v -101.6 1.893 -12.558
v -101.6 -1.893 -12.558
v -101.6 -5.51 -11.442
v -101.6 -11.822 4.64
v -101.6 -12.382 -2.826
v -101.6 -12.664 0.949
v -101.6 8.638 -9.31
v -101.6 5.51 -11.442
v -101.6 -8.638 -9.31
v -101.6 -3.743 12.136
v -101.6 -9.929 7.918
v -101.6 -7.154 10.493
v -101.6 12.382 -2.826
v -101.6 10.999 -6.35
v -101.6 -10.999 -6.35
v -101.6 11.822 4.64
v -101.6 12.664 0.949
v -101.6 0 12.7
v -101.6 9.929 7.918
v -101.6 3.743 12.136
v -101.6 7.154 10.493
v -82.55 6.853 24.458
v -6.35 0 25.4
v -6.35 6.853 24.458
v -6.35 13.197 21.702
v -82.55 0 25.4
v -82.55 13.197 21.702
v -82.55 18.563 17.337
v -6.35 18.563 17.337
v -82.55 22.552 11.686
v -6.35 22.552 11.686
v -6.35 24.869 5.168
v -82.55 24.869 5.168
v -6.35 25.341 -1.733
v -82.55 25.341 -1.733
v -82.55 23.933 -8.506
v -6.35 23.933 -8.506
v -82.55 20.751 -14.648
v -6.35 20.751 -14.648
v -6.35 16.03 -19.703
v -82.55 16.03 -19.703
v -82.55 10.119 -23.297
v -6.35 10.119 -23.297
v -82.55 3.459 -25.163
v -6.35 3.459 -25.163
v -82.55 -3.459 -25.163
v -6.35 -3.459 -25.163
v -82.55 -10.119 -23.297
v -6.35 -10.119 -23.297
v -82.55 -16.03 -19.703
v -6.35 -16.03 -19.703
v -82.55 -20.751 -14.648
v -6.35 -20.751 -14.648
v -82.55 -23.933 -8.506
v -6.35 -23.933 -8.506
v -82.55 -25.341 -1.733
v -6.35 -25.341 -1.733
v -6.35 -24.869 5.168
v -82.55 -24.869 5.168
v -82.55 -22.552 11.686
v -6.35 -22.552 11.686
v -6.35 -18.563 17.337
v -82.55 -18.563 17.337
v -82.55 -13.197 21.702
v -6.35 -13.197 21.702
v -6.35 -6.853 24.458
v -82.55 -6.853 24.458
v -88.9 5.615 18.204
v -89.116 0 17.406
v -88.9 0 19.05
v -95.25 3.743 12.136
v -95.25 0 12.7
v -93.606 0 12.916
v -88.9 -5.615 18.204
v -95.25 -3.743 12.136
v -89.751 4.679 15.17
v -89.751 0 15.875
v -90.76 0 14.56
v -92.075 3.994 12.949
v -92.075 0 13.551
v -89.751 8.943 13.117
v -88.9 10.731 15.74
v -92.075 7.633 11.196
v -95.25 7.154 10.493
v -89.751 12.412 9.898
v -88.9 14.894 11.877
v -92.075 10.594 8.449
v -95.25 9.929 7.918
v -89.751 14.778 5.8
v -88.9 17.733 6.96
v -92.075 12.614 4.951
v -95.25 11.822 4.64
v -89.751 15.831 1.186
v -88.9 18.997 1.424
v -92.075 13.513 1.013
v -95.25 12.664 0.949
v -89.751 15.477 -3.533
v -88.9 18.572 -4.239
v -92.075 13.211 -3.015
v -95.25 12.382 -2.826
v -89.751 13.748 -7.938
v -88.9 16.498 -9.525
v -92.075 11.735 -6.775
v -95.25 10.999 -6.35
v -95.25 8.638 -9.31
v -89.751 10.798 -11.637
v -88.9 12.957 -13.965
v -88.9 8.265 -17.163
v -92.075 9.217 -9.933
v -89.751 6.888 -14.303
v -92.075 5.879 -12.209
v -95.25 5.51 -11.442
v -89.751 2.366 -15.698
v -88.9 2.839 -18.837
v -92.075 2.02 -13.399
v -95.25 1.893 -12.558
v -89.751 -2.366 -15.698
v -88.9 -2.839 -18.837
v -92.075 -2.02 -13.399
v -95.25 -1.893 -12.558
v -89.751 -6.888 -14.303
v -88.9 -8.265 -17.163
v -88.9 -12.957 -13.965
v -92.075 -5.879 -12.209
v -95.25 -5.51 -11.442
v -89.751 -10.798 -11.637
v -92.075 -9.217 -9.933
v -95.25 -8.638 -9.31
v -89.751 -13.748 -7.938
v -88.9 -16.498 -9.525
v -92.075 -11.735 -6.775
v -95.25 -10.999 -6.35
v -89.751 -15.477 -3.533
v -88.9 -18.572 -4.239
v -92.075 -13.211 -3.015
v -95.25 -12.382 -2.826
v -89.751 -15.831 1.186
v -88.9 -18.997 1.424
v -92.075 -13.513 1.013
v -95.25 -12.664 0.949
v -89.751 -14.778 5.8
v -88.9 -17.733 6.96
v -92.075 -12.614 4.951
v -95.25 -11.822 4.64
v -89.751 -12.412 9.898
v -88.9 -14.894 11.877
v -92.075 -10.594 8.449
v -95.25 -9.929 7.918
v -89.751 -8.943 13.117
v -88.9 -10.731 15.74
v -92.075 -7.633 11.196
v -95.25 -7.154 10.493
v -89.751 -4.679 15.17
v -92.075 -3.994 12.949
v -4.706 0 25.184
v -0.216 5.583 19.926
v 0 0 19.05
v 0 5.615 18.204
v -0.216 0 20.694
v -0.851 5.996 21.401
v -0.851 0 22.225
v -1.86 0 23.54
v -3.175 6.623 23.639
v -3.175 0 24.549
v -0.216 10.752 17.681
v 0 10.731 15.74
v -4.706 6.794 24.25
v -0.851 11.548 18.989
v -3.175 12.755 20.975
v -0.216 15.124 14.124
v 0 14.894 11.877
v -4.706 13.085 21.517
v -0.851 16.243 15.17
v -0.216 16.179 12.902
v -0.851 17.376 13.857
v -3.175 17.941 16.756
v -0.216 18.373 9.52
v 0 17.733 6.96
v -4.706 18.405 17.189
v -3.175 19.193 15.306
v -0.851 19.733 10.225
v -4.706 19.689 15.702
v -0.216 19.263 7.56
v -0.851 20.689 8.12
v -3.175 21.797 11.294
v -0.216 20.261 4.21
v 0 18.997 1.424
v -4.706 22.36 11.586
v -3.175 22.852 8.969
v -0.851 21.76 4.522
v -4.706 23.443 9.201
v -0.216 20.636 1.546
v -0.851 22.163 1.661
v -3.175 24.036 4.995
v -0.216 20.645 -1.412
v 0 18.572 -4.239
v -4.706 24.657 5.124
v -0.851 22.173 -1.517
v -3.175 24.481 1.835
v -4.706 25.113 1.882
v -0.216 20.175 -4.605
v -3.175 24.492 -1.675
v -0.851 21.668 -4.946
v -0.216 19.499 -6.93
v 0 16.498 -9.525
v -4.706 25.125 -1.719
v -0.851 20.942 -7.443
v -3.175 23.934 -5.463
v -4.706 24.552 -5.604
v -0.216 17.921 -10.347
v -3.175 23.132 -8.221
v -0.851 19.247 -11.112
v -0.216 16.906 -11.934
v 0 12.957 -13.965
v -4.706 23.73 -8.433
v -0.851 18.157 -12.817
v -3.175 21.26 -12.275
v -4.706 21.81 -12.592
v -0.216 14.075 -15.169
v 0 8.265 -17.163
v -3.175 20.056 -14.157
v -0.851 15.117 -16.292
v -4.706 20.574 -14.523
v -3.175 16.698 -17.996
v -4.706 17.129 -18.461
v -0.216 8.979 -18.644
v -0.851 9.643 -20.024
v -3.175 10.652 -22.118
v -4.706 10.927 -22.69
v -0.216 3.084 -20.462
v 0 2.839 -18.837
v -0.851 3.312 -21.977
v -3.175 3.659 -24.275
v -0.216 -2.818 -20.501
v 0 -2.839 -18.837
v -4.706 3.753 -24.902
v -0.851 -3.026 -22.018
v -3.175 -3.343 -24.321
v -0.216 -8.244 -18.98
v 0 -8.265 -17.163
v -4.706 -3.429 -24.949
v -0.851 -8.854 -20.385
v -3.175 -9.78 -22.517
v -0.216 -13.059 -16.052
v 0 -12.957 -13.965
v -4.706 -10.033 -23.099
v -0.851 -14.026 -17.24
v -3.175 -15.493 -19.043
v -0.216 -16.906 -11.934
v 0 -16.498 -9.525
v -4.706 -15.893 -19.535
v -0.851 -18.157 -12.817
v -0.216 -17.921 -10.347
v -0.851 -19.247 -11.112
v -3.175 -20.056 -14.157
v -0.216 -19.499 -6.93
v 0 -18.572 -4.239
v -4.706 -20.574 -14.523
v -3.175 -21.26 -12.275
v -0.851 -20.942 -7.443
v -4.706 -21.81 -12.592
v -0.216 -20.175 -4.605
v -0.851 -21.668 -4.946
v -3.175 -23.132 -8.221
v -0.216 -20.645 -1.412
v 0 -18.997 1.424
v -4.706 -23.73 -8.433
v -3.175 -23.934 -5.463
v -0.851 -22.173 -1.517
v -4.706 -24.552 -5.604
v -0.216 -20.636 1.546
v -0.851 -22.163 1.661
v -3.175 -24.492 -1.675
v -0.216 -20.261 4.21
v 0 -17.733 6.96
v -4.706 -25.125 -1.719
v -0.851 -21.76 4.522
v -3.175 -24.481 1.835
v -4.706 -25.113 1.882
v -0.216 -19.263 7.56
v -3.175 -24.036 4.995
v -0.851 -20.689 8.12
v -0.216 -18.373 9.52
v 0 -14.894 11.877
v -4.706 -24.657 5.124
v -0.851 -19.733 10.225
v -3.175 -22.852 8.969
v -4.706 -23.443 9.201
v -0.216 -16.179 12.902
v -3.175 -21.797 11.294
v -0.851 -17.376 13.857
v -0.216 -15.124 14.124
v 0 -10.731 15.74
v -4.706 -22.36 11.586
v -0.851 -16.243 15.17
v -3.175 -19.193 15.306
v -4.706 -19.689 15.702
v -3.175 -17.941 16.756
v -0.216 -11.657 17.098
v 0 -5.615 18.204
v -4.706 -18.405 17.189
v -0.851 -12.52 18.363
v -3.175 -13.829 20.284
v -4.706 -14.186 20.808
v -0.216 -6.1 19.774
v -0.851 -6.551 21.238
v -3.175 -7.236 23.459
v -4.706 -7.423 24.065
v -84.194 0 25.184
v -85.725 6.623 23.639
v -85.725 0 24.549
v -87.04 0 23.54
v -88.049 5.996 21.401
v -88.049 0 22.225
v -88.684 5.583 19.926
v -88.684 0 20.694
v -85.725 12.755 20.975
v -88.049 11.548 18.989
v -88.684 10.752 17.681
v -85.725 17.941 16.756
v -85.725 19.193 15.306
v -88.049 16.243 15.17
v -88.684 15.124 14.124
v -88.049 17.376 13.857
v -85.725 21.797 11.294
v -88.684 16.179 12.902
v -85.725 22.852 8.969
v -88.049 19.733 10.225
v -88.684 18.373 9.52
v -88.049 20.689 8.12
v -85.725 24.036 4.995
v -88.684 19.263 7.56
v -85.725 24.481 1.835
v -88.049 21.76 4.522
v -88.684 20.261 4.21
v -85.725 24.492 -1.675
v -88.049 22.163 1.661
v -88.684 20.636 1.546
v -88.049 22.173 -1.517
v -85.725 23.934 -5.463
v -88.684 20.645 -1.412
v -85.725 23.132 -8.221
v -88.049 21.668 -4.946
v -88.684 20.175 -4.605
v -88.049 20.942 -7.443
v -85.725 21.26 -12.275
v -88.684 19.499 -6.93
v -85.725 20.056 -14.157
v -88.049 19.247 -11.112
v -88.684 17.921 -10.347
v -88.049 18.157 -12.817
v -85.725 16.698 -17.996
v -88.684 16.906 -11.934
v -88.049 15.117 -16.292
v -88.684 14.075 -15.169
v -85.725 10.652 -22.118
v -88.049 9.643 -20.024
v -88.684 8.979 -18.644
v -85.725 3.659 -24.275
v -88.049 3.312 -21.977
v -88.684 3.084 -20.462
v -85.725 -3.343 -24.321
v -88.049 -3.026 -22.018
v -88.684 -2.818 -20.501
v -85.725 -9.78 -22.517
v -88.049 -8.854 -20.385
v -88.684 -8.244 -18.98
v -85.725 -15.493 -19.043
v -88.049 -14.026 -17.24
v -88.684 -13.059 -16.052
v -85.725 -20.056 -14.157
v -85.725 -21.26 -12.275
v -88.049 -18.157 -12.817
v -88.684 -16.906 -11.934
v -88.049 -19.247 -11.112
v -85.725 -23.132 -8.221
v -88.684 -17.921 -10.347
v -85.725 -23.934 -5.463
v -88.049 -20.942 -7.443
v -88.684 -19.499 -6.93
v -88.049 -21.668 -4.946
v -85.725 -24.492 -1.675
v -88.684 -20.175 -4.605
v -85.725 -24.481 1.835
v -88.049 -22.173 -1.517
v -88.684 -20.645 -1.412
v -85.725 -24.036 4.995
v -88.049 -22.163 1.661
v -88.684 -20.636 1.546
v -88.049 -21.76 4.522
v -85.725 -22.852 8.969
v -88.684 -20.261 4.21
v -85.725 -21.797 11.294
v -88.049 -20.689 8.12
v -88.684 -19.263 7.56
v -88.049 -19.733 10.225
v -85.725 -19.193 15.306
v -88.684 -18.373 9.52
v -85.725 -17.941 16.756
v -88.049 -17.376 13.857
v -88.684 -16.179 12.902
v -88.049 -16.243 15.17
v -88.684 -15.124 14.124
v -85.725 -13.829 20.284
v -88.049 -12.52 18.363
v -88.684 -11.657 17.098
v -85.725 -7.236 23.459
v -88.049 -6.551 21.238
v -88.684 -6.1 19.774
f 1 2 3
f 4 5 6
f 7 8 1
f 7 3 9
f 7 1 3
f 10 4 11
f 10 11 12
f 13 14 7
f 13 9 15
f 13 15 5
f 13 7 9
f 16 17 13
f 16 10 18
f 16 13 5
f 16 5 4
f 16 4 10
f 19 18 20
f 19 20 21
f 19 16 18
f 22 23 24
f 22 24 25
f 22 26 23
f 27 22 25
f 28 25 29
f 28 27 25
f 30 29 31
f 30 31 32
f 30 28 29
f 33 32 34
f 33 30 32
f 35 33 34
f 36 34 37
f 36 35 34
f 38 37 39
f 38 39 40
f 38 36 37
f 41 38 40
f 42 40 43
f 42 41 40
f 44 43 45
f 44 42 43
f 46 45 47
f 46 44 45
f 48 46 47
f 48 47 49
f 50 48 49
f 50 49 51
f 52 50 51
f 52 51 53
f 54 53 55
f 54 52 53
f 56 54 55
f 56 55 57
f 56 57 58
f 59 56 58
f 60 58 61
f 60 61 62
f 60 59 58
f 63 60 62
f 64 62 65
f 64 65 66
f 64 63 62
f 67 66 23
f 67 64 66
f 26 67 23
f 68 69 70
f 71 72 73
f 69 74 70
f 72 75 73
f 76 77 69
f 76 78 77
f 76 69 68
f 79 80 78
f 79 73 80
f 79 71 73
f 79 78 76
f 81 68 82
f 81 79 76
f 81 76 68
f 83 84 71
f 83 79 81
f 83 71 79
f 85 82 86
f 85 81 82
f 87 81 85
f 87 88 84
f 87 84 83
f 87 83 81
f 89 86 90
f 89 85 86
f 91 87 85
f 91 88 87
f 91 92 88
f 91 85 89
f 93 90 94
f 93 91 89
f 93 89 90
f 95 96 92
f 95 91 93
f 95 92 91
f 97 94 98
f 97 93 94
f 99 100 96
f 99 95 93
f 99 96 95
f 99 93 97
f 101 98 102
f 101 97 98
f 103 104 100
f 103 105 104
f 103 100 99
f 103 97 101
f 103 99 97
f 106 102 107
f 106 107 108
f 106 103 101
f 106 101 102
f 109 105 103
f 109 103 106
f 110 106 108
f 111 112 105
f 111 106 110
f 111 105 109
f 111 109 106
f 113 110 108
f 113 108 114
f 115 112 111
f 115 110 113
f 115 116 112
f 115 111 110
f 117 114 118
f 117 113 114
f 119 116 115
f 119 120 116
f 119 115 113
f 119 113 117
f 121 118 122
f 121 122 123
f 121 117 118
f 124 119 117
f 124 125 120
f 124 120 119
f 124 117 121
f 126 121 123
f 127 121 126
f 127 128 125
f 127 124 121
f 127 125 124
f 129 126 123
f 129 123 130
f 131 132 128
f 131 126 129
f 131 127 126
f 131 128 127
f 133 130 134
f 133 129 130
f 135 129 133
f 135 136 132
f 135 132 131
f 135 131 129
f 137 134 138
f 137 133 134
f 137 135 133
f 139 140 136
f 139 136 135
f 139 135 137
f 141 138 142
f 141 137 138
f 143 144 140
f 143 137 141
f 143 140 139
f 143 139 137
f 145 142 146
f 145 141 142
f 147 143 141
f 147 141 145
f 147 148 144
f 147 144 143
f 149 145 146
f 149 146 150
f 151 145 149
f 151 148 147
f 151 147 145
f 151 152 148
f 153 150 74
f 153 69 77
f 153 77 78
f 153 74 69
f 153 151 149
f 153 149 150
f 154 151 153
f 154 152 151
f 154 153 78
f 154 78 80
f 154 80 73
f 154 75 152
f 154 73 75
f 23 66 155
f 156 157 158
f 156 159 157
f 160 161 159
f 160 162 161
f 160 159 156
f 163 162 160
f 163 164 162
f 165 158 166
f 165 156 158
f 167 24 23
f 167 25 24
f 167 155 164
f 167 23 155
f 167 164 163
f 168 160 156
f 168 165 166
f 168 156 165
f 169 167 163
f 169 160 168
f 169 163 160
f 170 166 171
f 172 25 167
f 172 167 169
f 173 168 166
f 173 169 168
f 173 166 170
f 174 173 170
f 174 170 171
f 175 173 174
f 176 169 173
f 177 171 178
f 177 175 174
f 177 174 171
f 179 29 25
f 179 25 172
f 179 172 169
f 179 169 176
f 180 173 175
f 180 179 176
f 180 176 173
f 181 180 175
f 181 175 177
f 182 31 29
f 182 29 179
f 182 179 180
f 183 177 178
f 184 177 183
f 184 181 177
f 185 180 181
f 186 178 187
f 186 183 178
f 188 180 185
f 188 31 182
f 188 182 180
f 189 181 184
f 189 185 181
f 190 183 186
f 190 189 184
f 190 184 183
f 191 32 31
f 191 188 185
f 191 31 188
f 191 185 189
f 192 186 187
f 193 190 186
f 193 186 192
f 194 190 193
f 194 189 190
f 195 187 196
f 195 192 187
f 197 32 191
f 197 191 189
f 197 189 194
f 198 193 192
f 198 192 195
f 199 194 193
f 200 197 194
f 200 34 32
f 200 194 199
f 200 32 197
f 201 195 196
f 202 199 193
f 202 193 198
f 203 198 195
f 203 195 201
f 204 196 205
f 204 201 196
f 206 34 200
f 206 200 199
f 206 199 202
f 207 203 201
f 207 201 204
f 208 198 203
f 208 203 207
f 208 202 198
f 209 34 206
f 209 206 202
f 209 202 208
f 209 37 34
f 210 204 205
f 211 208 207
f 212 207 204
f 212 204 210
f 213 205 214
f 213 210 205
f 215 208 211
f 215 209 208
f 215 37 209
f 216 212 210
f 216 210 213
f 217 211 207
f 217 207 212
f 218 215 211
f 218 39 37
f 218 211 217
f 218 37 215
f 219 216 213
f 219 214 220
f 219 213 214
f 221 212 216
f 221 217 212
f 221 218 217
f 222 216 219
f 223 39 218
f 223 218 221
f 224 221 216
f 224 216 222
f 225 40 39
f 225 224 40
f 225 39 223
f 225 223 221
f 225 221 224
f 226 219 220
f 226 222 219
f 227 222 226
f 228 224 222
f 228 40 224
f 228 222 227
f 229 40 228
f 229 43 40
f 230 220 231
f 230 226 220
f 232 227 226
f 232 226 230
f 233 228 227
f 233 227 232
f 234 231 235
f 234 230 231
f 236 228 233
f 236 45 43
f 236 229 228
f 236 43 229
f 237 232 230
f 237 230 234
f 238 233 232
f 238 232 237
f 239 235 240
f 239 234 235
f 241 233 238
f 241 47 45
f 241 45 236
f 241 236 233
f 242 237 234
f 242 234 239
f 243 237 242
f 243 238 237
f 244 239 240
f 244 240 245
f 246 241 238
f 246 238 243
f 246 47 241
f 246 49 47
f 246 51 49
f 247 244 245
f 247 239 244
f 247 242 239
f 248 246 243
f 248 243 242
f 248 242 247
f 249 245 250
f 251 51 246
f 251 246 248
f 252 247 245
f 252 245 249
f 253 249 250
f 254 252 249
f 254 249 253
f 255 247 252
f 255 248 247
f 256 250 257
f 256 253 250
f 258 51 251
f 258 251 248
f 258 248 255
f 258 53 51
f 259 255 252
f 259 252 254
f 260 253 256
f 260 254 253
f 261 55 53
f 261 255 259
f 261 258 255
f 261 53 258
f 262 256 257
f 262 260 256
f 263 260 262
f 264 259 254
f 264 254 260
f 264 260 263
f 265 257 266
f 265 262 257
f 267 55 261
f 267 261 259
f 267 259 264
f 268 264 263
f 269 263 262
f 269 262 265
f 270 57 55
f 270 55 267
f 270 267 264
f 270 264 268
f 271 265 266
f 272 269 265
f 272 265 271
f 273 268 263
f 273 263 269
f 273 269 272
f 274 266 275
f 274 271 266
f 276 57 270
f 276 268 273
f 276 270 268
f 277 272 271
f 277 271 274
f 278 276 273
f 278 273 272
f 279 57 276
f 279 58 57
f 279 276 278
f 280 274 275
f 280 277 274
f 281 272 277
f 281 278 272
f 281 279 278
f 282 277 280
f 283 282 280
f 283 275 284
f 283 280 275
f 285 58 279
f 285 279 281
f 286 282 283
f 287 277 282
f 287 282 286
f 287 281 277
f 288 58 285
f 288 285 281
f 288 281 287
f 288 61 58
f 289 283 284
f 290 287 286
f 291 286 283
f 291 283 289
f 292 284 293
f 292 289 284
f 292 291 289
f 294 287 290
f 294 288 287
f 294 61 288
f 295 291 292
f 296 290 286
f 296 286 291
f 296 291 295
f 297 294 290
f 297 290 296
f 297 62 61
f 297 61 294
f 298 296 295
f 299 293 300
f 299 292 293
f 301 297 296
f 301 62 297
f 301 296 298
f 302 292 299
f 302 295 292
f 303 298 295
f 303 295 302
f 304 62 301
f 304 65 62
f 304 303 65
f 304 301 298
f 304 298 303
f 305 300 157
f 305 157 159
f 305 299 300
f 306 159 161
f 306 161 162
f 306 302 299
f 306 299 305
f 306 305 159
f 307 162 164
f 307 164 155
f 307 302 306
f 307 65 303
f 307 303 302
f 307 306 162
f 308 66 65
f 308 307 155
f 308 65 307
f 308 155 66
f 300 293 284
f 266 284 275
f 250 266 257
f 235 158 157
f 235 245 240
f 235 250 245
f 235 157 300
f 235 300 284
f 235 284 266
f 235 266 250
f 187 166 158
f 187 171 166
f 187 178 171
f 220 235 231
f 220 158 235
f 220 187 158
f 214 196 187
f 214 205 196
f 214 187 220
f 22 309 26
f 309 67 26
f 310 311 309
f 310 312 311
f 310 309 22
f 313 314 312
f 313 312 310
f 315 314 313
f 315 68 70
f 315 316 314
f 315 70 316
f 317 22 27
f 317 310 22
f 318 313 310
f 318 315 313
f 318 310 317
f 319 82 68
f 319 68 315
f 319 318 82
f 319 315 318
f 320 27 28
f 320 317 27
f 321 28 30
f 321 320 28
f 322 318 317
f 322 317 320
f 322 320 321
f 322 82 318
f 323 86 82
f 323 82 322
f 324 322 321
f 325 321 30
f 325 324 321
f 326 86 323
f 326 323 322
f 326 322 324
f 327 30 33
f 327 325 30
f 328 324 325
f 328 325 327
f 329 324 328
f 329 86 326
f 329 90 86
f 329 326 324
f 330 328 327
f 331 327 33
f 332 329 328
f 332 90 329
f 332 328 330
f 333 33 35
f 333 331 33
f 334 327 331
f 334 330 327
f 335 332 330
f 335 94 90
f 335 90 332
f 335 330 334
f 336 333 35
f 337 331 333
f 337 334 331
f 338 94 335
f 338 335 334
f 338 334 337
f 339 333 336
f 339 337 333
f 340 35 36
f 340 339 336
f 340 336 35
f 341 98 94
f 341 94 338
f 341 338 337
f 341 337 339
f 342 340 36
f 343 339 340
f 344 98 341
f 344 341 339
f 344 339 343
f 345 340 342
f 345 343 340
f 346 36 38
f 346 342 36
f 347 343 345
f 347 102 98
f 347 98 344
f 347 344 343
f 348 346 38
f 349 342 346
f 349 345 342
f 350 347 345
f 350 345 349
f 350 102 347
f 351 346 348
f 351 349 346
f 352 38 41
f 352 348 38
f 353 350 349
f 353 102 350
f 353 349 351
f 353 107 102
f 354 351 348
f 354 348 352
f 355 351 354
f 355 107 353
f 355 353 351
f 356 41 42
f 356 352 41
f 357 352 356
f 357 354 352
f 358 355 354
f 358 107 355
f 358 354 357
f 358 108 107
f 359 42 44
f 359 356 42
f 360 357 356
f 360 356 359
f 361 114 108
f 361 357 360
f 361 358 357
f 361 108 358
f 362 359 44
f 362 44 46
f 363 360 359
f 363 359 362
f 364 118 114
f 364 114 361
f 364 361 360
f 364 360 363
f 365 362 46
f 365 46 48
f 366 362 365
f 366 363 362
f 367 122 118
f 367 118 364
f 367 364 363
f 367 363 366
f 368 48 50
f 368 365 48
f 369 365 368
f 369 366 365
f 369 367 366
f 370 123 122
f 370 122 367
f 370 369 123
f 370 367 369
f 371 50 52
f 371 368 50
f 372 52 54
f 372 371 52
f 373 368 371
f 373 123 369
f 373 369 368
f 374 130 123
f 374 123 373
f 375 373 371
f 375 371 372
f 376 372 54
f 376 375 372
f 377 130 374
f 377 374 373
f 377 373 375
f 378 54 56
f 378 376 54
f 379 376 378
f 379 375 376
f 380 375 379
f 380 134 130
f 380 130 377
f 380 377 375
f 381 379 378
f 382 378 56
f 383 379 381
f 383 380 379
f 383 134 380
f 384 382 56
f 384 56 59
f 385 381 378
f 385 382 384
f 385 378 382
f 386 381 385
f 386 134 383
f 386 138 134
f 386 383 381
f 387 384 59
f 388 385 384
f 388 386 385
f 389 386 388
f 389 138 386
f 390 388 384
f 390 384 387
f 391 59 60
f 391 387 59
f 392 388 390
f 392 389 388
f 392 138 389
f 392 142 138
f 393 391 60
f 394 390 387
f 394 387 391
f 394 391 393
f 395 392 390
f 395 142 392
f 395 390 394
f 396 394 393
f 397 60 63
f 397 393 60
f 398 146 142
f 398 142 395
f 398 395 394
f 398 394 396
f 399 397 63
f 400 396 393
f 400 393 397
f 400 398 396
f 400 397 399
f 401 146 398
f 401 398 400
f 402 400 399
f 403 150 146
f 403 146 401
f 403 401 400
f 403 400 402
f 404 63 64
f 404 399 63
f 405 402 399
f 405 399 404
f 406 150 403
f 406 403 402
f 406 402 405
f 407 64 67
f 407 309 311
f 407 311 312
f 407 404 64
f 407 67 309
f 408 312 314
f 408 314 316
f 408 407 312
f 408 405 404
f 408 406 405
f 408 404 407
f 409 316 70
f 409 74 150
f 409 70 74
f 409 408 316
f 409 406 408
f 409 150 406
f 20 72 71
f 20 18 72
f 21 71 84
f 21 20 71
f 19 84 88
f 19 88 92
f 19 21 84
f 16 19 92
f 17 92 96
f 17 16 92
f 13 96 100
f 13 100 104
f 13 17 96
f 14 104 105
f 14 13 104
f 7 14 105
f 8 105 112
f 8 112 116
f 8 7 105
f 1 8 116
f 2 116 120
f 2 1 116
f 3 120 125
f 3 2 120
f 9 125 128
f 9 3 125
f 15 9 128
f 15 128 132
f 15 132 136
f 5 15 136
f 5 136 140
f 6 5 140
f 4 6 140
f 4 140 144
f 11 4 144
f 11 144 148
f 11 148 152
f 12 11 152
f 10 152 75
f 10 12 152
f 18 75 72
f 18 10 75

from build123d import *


with BuildPart() as f1:
    # F0 (on Front) → F1 (revolve)
    with BuildSketch(Plane.XZ):
        with BuildLine():
            Line((-101.6, 0), (0, 0))
            Line((0, 0), (0, 19.05))
            ThreePointArc((0, 19.05), (-1.859872, 23.540128), (-6.35, 25.4))
            Line((-6.35, 25.4), (-82.55, 25.4))
            ThreePointArc((-82.55, 25.4), (-87.040128, 23.540128), (-88.9, 19.05))
            ThreePointArc((-88.9, 19.05), (-90.759872, 14.559872), (-95.25, 12.7))
            Line((-95.25, 12.7), (-101.6, 12.7))
            Line((-101.6, 12.7), (-101.6, 0))
        make_face()
    revolve(axis=Axis((-50.8, 0, 0), (-1, 0, 0)))


solid = f1.part
